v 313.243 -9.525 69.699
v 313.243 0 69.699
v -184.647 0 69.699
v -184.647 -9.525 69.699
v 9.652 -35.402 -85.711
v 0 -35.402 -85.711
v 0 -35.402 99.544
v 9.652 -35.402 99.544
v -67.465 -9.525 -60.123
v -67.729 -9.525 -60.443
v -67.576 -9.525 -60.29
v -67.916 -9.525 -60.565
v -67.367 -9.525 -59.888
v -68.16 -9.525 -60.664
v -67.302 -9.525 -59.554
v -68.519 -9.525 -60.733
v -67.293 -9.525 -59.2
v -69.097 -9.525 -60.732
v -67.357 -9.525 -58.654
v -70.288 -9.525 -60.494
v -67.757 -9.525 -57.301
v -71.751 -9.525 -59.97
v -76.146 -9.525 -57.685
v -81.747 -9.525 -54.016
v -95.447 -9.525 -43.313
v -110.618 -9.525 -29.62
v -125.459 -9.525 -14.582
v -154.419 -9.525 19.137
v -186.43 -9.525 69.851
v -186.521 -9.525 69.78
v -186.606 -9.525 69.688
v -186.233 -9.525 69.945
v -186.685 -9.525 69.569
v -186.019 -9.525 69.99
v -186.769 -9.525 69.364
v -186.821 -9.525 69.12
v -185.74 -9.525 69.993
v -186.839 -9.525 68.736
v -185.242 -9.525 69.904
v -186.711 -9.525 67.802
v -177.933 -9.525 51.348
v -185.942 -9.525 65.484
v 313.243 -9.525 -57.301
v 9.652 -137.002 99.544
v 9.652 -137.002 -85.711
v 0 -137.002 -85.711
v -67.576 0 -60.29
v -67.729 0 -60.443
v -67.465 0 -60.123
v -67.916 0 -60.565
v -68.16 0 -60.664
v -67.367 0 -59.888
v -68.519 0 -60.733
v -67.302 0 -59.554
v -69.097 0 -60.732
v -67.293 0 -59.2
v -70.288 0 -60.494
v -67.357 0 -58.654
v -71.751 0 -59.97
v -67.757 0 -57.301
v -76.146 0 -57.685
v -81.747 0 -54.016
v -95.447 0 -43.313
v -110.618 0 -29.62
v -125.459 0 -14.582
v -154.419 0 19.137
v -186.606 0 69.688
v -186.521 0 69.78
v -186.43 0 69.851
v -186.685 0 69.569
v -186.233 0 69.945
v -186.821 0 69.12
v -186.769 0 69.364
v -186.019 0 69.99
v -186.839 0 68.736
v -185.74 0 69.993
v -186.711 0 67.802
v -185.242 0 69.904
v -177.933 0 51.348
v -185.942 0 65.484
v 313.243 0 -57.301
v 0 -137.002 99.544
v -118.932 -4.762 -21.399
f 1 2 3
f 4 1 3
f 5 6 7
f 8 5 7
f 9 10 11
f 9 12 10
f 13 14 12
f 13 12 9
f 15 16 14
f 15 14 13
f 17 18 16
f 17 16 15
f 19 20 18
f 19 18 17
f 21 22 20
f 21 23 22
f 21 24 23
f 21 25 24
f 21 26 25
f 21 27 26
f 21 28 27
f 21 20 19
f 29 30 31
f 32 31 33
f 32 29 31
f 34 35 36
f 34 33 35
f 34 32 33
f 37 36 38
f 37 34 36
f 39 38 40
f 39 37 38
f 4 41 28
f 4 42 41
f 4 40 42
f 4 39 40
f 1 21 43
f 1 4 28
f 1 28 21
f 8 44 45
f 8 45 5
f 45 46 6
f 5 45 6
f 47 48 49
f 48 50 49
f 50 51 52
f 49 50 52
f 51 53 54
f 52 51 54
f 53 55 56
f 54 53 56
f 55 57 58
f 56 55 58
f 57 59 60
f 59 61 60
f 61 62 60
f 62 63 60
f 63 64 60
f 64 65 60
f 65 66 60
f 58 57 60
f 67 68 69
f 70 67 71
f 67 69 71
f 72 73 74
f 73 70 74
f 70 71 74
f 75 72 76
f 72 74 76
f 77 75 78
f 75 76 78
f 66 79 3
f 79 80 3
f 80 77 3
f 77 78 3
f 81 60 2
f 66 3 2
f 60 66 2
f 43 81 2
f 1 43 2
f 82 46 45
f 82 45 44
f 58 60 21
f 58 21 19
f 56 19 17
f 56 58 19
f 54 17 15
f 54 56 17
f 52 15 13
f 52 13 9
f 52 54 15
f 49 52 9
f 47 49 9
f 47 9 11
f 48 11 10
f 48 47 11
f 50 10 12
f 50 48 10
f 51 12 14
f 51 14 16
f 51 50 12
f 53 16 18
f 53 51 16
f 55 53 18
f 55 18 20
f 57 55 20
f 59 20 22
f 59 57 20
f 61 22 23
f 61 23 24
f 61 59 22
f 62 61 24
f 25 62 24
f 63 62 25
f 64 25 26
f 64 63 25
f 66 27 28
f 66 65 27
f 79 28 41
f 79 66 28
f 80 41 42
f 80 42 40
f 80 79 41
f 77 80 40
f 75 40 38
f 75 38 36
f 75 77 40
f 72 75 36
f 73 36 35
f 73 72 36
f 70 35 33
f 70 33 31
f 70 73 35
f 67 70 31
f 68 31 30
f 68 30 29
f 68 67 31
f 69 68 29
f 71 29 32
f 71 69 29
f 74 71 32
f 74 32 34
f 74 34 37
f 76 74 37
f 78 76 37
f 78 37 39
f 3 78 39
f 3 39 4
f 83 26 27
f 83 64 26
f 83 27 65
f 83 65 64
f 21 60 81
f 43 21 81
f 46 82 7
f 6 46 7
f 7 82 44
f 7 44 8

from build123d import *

# Parameters (mm, degrees)
F0_W     = 367.9767533813
F0_H     = 112.8609888256
F1_DEPTH = 9.525
F2_W     = 101.6
F2_H     = 185.2550778
F3_DEPTH = 9.652


with BuildPart() as f1:
    # F0 (on Front) → F1 (new body)
    with BuildSketch(Plane.XZ):
        with Locations((116.2313975556, 13.2681597024)):
            Rectangle(F0_W, F0_H)
        with BuildLine():
            Line((-67.756979135, -43.1623347104), (-67.756979135, 69.6986541152))
            Line((-67.756979135, 69.6986541152), (-184.6469789743, 69.6986541152))
            add(Edge.make_bspline(
                [(-184.6469789743, 69.6986541152), (-169.7059729536, 63.5757160212), (-75.0461899969, -38.240863824), (-67.756979135, -57.3013458848)],
                knots=[0, 0, 0, 0, 0.4151936097, 0.4151936097, 0.4151936097, 0.4151936097], degree=3))
            Line((-67.756979135, -57.3013458848), (-67.756979135, -43.1623347104))
        make_face()
        Polygon((313.243020865, 69.6986541152), (300.2197742462, 69.6986541152), (300.2197742462, -43.1623347104), (-67.756979135, -43.1623347104), (-67.756979135, -57.3013458848), (313.243020865, -57.3013458848), align=None)
        with BuildLine():
            add(Edge.make_bspline(
                [(-184.6469789743, 69.6986541152), (-169.7059729536, 63.5757160212), (-75.0461899969, -38.240863824), (-67.756979135, -57.3013458848)],
                knots=[0, 0, 0, 0, 0.4151936097, 0.4151936097, 0.4151936097, 0.4151936097], degree=3))
            add(Edge.make_bspline(
                [(-67.756979135, -57.3013458848), (-63.3702715526, -68.7721021527), (-127.1634956509, -25.4703757202), (-196.6999873394, 74.638068768), (-184.6469789743, 69.6986541152)],
                knots=[0.4151936097, 0.4151936097, 0.4151936097, 0.4151936097, 0.6650605693, 1, 1, 1, 1], degree=3))
        make_face()
    extrude(amount=F1_DEPTH)


with BuildPart() as f3:
    # F2 (on Right) → F3 (new body)
    with BuildSketch(Plane.YZ):
        with Locations((-86.2020223837, 6.9163870066)):
            Rectangle(F2_W, F2_H)
    extrude(amount=F3_DEPTH)


solid = Compound([f1.part, f3.part])
